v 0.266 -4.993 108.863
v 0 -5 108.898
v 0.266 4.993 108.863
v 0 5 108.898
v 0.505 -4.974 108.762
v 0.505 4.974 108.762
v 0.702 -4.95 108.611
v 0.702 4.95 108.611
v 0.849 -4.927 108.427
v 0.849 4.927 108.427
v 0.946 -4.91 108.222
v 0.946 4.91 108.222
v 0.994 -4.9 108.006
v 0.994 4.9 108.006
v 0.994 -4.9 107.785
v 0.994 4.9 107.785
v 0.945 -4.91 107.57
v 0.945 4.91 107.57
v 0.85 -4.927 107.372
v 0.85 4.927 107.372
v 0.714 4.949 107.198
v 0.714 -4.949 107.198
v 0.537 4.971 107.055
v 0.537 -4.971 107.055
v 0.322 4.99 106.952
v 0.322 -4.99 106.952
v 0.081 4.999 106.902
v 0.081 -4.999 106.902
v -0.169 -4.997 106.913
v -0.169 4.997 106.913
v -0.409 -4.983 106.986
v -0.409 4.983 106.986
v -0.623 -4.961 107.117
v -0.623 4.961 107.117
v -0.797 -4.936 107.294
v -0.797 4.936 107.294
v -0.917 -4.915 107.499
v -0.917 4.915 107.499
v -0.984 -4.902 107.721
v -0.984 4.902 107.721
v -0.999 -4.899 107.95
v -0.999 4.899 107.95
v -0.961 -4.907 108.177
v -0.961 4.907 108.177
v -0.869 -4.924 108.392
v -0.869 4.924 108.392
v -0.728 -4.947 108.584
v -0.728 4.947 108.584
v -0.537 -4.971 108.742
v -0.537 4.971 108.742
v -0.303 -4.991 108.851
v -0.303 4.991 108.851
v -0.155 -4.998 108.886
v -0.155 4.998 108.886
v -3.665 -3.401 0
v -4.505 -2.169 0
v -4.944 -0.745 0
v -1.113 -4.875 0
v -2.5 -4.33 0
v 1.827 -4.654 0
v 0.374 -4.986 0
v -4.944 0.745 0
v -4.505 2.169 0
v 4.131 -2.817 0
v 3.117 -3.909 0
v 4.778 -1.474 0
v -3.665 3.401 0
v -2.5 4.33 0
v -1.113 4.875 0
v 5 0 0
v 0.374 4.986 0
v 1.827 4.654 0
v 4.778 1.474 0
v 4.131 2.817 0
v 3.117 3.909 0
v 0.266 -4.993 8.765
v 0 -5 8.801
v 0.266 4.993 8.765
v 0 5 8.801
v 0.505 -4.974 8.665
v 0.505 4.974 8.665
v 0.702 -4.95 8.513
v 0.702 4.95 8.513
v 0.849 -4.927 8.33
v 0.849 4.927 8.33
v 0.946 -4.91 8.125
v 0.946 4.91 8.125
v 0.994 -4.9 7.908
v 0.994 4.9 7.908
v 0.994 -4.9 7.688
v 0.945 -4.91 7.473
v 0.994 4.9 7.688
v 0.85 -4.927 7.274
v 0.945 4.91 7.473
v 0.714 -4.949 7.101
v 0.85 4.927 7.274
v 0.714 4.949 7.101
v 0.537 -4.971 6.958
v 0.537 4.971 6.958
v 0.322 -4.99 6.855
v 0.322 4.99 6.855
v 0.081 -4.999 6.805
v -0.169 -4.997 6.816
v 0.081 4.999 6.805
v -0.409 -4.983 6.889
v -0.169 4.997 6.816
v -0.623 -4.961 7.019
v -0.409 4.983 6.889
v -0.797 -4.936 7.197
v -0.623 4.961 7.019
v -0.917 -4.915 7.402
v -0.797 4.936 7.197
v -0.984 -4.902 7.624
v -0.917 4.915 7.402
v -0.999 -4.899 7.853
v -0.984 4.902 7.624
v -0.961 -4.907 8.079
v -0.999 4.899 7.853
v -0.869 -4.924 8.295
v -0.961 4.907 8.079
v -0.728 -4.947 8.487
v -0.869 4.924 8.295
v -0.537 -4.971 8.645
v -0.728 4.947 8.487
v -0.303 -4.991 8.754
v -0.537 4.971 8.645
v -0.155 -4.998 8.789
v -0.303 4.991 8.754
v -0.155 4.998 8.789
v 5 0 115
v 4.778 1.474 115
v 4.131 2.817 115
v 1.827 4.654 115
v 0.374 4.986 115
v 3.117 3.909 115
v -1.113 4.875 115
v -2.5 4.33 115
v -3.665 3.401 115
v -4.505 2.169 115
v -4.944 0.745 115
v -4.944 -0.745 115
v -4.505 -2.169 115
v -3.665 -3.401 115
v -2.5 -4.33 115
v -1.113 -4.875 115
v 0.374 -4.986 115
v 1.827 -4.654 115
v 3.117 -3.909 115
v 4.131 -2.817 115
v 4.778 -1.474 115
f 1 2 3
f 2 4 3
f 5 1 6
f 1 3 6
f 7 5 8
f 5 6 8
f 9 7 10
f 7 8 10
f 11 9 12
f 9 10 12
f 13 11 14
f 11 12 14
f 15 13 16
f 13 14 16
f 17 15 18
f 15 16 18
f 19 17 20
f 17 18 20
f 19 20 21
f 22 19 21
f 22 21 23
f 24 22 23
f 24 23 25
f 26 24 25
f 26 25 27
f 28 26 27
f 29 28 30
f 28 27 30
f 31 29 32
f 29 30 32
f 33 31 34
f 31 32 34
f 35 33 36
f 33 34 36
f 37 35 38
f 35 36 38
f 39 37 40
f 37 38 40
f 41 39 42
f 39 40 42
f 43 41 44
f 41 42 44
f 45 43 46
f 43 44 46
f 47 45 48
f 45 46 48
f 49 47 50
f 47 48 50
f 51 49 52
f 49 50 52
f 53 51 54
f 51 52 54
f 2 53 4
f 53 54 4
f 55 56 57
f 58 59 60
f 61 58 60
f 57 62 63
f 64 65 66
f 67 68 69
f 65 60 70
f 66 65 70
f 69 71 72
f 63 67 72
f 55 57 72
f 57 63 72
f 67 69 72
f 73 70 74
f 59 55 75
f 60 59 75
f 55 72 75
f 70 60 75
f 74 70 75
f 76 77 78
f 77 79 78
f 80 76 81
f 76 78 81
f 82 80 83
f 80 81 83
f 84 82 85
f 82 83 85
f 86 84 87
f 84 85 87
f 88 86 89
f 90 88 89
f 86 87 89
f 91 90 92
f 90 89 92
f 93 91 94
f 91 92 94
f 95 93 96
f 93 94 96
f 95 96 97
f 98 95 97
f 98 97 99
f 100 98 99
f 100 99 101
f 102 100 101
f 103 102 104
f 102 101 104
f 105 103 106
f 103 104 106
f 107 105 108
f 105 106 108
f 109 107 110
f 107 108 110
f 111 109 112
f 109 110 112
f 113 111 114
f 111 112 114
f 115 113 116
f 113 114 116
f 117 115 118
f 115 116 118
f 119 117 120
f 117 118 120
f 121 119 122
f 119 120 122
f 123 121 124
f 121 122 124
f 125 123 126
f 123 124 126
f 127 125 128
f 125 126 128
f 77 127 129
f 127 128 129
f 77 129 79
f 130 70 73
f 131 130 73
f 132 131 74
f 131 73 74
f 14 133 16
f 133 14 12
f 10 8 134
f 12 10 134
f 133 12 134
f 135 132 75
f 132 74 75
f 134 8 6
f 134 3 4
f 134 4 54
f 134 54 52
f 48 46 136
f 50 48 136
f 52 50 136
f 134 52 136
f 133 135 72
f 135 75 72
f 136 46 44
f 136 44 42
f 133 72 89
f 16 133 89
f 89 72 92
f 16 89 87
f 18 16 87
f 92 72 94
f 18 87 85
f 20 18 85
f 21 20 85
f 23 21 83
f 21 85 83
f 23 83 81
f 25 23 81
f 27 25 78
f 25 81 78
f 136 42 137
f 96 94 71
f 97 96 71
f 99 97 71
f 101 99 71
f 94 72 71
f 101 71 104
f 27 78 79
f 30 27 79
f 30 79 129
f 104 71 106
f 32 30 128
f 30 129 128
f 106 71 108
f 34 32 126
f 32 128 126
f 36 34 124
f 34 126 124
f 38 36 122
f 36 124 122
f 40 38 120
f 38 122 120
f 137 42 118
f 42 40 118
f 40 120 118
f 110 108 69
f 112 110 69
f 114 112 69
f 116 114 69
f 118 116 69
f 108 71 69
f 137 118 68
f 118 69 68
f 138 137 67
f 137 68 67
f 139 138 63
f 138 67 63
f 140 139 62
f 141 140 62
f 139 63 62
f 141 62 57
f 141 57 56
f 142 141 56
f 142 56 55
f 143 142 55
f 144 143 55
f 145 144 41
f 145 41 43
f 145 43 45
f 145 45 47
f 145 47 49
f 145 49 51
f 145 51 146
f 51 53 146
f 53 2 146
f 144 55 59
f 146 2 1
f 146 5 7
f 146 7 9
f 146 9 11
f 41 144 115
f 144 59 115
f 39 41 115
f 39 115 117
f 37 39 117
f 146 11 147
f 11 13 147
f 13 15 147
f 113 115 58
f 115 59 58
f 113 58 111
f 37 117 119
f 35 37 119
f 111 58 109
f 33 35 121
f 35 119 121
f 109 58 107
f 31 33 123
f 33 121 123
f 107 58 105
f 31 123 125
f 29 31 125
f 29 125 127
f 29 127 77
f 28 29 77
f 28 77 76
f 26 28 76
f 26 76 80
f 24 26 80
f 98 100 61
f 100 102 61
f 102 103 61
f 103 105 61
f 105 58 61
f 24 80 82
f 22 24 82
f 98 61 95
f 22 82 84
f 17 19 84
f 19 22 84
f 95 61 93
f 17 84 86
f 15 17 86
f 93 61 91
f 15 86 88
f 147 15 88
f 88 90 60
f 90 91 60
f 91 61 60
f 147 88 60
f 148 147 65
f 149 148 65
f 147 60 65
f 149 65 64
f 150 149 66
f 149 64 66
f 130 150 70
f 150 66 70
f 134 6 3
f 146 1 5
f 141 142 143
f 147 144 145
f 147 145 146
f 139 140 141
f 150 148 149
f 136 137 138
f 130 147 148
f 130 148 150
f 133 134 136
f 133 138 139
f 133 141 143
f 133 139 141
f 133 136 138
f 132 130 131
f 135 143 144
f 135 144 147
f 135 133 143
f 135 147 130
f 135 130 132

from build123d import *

# Parameters (mm, degrees)
SKETCH_1_R          = 5
EXTRUDE_1_DEPTH     = 115
SKETCH_2_R          = 1
CUT_EXTRUDE_1_DEPTH = 10
SKETCH_4_R          = 1
CUT_EXTRUDE_2_DEPTH = 10


with BuildPart() as part:
    # Эскиз1 → Вытянуть1 (new body)
    with BuildSketch(Plane.XY):
        Circle(SKETCH_1_R)
    extrude(amount=EXTRUDE_1_DEPTH)

    # Эскиз2 → Вырез-Вытянуть1 (cut, symmetric)
    with BuildSketch(Plane(origin=(0, 0, 0), x_dir=(1, 0, 0), z_dir=(0, 1, 0))):
        with Locations(Location((0, -7.801268192, 0), (0, 0, 270))):
            Circle(SKETCH_2_R)
    extrude(amount=CUT_EXTRUDE_1_DEPTH, both=True, mode=Mode.SUBTRACT)

    # Эскиз4 → Вырез-Вытянуть2 (cut, symmetric)
    with BuildSketch(Plane(origin=(0, 0, 0), x_dir=(1, 0, 0), z_dir=(0, 1, 0))):
        with Locations(Location((0, -107.898465976, 0), (0, 0, 270))):
            Circle(SKETCH_4_R)
    extrude(amount=CUT_EXTRUDE_2_DEPTH, both=True, mode=Mode.SUBTRACT)


solid = part.part
